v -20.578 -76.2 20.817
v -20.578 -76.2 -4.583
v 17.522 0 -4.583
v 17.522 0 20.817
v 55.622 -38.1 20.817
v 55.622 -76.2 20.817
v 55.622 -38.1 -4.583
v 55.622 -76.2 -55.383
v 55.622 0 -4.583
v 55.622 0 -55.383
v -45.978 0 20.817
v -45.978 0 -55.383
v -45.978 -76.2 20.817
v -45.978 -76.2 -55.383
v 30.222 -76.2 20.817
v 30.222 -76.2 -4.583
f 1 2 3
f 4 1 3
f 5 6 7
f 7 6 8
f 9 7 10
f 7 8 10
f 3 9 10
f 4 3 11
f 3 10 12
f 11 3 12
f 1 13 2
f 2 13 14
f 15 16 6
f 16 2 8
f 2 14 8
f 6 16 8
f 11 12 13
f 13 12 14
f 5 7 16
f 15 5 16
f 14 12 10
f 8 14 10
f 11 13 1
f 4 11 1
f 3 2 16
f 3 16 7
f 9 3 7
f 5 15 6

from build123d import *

# Parameters (mm, degrees)
F0_W     = 101.6
F0_H     = 50.8
F1_DEPTH = 76.2
F3_DEPTH = 25.4
F5_DEPTH = 25.4


with BuildPart() as f1:
    # F0 (on Front) → F1 (new body)
    with BuildSketch(Plane.XZ):
        with Locations((4.822348, -29.982933)):
            Rectangle(F0_W, F0_H)
    extrude(amount=F1_DEPTH)

    # F2 (on face) → F3 (join)
    with BuildSketch(Plane.XY.offset(-4.582933)):
        Polygon((30.222348, -76.2), (55.622348, -76.2), (55.622348, -38.1), align=None)
    extrude(amount=F3_DEPTH)

    # F4 (on face) → F5 (join)
    with BuildSketch(Plane.XY.offset(-4.582933)):
        Polygon((-45.977652, 0), (-45.977652, -76.2), (-20.577652, -76.2), (17.522348, 0), align=None)
    extrude(amount=F5_DEPTH)


solid = f1.part
